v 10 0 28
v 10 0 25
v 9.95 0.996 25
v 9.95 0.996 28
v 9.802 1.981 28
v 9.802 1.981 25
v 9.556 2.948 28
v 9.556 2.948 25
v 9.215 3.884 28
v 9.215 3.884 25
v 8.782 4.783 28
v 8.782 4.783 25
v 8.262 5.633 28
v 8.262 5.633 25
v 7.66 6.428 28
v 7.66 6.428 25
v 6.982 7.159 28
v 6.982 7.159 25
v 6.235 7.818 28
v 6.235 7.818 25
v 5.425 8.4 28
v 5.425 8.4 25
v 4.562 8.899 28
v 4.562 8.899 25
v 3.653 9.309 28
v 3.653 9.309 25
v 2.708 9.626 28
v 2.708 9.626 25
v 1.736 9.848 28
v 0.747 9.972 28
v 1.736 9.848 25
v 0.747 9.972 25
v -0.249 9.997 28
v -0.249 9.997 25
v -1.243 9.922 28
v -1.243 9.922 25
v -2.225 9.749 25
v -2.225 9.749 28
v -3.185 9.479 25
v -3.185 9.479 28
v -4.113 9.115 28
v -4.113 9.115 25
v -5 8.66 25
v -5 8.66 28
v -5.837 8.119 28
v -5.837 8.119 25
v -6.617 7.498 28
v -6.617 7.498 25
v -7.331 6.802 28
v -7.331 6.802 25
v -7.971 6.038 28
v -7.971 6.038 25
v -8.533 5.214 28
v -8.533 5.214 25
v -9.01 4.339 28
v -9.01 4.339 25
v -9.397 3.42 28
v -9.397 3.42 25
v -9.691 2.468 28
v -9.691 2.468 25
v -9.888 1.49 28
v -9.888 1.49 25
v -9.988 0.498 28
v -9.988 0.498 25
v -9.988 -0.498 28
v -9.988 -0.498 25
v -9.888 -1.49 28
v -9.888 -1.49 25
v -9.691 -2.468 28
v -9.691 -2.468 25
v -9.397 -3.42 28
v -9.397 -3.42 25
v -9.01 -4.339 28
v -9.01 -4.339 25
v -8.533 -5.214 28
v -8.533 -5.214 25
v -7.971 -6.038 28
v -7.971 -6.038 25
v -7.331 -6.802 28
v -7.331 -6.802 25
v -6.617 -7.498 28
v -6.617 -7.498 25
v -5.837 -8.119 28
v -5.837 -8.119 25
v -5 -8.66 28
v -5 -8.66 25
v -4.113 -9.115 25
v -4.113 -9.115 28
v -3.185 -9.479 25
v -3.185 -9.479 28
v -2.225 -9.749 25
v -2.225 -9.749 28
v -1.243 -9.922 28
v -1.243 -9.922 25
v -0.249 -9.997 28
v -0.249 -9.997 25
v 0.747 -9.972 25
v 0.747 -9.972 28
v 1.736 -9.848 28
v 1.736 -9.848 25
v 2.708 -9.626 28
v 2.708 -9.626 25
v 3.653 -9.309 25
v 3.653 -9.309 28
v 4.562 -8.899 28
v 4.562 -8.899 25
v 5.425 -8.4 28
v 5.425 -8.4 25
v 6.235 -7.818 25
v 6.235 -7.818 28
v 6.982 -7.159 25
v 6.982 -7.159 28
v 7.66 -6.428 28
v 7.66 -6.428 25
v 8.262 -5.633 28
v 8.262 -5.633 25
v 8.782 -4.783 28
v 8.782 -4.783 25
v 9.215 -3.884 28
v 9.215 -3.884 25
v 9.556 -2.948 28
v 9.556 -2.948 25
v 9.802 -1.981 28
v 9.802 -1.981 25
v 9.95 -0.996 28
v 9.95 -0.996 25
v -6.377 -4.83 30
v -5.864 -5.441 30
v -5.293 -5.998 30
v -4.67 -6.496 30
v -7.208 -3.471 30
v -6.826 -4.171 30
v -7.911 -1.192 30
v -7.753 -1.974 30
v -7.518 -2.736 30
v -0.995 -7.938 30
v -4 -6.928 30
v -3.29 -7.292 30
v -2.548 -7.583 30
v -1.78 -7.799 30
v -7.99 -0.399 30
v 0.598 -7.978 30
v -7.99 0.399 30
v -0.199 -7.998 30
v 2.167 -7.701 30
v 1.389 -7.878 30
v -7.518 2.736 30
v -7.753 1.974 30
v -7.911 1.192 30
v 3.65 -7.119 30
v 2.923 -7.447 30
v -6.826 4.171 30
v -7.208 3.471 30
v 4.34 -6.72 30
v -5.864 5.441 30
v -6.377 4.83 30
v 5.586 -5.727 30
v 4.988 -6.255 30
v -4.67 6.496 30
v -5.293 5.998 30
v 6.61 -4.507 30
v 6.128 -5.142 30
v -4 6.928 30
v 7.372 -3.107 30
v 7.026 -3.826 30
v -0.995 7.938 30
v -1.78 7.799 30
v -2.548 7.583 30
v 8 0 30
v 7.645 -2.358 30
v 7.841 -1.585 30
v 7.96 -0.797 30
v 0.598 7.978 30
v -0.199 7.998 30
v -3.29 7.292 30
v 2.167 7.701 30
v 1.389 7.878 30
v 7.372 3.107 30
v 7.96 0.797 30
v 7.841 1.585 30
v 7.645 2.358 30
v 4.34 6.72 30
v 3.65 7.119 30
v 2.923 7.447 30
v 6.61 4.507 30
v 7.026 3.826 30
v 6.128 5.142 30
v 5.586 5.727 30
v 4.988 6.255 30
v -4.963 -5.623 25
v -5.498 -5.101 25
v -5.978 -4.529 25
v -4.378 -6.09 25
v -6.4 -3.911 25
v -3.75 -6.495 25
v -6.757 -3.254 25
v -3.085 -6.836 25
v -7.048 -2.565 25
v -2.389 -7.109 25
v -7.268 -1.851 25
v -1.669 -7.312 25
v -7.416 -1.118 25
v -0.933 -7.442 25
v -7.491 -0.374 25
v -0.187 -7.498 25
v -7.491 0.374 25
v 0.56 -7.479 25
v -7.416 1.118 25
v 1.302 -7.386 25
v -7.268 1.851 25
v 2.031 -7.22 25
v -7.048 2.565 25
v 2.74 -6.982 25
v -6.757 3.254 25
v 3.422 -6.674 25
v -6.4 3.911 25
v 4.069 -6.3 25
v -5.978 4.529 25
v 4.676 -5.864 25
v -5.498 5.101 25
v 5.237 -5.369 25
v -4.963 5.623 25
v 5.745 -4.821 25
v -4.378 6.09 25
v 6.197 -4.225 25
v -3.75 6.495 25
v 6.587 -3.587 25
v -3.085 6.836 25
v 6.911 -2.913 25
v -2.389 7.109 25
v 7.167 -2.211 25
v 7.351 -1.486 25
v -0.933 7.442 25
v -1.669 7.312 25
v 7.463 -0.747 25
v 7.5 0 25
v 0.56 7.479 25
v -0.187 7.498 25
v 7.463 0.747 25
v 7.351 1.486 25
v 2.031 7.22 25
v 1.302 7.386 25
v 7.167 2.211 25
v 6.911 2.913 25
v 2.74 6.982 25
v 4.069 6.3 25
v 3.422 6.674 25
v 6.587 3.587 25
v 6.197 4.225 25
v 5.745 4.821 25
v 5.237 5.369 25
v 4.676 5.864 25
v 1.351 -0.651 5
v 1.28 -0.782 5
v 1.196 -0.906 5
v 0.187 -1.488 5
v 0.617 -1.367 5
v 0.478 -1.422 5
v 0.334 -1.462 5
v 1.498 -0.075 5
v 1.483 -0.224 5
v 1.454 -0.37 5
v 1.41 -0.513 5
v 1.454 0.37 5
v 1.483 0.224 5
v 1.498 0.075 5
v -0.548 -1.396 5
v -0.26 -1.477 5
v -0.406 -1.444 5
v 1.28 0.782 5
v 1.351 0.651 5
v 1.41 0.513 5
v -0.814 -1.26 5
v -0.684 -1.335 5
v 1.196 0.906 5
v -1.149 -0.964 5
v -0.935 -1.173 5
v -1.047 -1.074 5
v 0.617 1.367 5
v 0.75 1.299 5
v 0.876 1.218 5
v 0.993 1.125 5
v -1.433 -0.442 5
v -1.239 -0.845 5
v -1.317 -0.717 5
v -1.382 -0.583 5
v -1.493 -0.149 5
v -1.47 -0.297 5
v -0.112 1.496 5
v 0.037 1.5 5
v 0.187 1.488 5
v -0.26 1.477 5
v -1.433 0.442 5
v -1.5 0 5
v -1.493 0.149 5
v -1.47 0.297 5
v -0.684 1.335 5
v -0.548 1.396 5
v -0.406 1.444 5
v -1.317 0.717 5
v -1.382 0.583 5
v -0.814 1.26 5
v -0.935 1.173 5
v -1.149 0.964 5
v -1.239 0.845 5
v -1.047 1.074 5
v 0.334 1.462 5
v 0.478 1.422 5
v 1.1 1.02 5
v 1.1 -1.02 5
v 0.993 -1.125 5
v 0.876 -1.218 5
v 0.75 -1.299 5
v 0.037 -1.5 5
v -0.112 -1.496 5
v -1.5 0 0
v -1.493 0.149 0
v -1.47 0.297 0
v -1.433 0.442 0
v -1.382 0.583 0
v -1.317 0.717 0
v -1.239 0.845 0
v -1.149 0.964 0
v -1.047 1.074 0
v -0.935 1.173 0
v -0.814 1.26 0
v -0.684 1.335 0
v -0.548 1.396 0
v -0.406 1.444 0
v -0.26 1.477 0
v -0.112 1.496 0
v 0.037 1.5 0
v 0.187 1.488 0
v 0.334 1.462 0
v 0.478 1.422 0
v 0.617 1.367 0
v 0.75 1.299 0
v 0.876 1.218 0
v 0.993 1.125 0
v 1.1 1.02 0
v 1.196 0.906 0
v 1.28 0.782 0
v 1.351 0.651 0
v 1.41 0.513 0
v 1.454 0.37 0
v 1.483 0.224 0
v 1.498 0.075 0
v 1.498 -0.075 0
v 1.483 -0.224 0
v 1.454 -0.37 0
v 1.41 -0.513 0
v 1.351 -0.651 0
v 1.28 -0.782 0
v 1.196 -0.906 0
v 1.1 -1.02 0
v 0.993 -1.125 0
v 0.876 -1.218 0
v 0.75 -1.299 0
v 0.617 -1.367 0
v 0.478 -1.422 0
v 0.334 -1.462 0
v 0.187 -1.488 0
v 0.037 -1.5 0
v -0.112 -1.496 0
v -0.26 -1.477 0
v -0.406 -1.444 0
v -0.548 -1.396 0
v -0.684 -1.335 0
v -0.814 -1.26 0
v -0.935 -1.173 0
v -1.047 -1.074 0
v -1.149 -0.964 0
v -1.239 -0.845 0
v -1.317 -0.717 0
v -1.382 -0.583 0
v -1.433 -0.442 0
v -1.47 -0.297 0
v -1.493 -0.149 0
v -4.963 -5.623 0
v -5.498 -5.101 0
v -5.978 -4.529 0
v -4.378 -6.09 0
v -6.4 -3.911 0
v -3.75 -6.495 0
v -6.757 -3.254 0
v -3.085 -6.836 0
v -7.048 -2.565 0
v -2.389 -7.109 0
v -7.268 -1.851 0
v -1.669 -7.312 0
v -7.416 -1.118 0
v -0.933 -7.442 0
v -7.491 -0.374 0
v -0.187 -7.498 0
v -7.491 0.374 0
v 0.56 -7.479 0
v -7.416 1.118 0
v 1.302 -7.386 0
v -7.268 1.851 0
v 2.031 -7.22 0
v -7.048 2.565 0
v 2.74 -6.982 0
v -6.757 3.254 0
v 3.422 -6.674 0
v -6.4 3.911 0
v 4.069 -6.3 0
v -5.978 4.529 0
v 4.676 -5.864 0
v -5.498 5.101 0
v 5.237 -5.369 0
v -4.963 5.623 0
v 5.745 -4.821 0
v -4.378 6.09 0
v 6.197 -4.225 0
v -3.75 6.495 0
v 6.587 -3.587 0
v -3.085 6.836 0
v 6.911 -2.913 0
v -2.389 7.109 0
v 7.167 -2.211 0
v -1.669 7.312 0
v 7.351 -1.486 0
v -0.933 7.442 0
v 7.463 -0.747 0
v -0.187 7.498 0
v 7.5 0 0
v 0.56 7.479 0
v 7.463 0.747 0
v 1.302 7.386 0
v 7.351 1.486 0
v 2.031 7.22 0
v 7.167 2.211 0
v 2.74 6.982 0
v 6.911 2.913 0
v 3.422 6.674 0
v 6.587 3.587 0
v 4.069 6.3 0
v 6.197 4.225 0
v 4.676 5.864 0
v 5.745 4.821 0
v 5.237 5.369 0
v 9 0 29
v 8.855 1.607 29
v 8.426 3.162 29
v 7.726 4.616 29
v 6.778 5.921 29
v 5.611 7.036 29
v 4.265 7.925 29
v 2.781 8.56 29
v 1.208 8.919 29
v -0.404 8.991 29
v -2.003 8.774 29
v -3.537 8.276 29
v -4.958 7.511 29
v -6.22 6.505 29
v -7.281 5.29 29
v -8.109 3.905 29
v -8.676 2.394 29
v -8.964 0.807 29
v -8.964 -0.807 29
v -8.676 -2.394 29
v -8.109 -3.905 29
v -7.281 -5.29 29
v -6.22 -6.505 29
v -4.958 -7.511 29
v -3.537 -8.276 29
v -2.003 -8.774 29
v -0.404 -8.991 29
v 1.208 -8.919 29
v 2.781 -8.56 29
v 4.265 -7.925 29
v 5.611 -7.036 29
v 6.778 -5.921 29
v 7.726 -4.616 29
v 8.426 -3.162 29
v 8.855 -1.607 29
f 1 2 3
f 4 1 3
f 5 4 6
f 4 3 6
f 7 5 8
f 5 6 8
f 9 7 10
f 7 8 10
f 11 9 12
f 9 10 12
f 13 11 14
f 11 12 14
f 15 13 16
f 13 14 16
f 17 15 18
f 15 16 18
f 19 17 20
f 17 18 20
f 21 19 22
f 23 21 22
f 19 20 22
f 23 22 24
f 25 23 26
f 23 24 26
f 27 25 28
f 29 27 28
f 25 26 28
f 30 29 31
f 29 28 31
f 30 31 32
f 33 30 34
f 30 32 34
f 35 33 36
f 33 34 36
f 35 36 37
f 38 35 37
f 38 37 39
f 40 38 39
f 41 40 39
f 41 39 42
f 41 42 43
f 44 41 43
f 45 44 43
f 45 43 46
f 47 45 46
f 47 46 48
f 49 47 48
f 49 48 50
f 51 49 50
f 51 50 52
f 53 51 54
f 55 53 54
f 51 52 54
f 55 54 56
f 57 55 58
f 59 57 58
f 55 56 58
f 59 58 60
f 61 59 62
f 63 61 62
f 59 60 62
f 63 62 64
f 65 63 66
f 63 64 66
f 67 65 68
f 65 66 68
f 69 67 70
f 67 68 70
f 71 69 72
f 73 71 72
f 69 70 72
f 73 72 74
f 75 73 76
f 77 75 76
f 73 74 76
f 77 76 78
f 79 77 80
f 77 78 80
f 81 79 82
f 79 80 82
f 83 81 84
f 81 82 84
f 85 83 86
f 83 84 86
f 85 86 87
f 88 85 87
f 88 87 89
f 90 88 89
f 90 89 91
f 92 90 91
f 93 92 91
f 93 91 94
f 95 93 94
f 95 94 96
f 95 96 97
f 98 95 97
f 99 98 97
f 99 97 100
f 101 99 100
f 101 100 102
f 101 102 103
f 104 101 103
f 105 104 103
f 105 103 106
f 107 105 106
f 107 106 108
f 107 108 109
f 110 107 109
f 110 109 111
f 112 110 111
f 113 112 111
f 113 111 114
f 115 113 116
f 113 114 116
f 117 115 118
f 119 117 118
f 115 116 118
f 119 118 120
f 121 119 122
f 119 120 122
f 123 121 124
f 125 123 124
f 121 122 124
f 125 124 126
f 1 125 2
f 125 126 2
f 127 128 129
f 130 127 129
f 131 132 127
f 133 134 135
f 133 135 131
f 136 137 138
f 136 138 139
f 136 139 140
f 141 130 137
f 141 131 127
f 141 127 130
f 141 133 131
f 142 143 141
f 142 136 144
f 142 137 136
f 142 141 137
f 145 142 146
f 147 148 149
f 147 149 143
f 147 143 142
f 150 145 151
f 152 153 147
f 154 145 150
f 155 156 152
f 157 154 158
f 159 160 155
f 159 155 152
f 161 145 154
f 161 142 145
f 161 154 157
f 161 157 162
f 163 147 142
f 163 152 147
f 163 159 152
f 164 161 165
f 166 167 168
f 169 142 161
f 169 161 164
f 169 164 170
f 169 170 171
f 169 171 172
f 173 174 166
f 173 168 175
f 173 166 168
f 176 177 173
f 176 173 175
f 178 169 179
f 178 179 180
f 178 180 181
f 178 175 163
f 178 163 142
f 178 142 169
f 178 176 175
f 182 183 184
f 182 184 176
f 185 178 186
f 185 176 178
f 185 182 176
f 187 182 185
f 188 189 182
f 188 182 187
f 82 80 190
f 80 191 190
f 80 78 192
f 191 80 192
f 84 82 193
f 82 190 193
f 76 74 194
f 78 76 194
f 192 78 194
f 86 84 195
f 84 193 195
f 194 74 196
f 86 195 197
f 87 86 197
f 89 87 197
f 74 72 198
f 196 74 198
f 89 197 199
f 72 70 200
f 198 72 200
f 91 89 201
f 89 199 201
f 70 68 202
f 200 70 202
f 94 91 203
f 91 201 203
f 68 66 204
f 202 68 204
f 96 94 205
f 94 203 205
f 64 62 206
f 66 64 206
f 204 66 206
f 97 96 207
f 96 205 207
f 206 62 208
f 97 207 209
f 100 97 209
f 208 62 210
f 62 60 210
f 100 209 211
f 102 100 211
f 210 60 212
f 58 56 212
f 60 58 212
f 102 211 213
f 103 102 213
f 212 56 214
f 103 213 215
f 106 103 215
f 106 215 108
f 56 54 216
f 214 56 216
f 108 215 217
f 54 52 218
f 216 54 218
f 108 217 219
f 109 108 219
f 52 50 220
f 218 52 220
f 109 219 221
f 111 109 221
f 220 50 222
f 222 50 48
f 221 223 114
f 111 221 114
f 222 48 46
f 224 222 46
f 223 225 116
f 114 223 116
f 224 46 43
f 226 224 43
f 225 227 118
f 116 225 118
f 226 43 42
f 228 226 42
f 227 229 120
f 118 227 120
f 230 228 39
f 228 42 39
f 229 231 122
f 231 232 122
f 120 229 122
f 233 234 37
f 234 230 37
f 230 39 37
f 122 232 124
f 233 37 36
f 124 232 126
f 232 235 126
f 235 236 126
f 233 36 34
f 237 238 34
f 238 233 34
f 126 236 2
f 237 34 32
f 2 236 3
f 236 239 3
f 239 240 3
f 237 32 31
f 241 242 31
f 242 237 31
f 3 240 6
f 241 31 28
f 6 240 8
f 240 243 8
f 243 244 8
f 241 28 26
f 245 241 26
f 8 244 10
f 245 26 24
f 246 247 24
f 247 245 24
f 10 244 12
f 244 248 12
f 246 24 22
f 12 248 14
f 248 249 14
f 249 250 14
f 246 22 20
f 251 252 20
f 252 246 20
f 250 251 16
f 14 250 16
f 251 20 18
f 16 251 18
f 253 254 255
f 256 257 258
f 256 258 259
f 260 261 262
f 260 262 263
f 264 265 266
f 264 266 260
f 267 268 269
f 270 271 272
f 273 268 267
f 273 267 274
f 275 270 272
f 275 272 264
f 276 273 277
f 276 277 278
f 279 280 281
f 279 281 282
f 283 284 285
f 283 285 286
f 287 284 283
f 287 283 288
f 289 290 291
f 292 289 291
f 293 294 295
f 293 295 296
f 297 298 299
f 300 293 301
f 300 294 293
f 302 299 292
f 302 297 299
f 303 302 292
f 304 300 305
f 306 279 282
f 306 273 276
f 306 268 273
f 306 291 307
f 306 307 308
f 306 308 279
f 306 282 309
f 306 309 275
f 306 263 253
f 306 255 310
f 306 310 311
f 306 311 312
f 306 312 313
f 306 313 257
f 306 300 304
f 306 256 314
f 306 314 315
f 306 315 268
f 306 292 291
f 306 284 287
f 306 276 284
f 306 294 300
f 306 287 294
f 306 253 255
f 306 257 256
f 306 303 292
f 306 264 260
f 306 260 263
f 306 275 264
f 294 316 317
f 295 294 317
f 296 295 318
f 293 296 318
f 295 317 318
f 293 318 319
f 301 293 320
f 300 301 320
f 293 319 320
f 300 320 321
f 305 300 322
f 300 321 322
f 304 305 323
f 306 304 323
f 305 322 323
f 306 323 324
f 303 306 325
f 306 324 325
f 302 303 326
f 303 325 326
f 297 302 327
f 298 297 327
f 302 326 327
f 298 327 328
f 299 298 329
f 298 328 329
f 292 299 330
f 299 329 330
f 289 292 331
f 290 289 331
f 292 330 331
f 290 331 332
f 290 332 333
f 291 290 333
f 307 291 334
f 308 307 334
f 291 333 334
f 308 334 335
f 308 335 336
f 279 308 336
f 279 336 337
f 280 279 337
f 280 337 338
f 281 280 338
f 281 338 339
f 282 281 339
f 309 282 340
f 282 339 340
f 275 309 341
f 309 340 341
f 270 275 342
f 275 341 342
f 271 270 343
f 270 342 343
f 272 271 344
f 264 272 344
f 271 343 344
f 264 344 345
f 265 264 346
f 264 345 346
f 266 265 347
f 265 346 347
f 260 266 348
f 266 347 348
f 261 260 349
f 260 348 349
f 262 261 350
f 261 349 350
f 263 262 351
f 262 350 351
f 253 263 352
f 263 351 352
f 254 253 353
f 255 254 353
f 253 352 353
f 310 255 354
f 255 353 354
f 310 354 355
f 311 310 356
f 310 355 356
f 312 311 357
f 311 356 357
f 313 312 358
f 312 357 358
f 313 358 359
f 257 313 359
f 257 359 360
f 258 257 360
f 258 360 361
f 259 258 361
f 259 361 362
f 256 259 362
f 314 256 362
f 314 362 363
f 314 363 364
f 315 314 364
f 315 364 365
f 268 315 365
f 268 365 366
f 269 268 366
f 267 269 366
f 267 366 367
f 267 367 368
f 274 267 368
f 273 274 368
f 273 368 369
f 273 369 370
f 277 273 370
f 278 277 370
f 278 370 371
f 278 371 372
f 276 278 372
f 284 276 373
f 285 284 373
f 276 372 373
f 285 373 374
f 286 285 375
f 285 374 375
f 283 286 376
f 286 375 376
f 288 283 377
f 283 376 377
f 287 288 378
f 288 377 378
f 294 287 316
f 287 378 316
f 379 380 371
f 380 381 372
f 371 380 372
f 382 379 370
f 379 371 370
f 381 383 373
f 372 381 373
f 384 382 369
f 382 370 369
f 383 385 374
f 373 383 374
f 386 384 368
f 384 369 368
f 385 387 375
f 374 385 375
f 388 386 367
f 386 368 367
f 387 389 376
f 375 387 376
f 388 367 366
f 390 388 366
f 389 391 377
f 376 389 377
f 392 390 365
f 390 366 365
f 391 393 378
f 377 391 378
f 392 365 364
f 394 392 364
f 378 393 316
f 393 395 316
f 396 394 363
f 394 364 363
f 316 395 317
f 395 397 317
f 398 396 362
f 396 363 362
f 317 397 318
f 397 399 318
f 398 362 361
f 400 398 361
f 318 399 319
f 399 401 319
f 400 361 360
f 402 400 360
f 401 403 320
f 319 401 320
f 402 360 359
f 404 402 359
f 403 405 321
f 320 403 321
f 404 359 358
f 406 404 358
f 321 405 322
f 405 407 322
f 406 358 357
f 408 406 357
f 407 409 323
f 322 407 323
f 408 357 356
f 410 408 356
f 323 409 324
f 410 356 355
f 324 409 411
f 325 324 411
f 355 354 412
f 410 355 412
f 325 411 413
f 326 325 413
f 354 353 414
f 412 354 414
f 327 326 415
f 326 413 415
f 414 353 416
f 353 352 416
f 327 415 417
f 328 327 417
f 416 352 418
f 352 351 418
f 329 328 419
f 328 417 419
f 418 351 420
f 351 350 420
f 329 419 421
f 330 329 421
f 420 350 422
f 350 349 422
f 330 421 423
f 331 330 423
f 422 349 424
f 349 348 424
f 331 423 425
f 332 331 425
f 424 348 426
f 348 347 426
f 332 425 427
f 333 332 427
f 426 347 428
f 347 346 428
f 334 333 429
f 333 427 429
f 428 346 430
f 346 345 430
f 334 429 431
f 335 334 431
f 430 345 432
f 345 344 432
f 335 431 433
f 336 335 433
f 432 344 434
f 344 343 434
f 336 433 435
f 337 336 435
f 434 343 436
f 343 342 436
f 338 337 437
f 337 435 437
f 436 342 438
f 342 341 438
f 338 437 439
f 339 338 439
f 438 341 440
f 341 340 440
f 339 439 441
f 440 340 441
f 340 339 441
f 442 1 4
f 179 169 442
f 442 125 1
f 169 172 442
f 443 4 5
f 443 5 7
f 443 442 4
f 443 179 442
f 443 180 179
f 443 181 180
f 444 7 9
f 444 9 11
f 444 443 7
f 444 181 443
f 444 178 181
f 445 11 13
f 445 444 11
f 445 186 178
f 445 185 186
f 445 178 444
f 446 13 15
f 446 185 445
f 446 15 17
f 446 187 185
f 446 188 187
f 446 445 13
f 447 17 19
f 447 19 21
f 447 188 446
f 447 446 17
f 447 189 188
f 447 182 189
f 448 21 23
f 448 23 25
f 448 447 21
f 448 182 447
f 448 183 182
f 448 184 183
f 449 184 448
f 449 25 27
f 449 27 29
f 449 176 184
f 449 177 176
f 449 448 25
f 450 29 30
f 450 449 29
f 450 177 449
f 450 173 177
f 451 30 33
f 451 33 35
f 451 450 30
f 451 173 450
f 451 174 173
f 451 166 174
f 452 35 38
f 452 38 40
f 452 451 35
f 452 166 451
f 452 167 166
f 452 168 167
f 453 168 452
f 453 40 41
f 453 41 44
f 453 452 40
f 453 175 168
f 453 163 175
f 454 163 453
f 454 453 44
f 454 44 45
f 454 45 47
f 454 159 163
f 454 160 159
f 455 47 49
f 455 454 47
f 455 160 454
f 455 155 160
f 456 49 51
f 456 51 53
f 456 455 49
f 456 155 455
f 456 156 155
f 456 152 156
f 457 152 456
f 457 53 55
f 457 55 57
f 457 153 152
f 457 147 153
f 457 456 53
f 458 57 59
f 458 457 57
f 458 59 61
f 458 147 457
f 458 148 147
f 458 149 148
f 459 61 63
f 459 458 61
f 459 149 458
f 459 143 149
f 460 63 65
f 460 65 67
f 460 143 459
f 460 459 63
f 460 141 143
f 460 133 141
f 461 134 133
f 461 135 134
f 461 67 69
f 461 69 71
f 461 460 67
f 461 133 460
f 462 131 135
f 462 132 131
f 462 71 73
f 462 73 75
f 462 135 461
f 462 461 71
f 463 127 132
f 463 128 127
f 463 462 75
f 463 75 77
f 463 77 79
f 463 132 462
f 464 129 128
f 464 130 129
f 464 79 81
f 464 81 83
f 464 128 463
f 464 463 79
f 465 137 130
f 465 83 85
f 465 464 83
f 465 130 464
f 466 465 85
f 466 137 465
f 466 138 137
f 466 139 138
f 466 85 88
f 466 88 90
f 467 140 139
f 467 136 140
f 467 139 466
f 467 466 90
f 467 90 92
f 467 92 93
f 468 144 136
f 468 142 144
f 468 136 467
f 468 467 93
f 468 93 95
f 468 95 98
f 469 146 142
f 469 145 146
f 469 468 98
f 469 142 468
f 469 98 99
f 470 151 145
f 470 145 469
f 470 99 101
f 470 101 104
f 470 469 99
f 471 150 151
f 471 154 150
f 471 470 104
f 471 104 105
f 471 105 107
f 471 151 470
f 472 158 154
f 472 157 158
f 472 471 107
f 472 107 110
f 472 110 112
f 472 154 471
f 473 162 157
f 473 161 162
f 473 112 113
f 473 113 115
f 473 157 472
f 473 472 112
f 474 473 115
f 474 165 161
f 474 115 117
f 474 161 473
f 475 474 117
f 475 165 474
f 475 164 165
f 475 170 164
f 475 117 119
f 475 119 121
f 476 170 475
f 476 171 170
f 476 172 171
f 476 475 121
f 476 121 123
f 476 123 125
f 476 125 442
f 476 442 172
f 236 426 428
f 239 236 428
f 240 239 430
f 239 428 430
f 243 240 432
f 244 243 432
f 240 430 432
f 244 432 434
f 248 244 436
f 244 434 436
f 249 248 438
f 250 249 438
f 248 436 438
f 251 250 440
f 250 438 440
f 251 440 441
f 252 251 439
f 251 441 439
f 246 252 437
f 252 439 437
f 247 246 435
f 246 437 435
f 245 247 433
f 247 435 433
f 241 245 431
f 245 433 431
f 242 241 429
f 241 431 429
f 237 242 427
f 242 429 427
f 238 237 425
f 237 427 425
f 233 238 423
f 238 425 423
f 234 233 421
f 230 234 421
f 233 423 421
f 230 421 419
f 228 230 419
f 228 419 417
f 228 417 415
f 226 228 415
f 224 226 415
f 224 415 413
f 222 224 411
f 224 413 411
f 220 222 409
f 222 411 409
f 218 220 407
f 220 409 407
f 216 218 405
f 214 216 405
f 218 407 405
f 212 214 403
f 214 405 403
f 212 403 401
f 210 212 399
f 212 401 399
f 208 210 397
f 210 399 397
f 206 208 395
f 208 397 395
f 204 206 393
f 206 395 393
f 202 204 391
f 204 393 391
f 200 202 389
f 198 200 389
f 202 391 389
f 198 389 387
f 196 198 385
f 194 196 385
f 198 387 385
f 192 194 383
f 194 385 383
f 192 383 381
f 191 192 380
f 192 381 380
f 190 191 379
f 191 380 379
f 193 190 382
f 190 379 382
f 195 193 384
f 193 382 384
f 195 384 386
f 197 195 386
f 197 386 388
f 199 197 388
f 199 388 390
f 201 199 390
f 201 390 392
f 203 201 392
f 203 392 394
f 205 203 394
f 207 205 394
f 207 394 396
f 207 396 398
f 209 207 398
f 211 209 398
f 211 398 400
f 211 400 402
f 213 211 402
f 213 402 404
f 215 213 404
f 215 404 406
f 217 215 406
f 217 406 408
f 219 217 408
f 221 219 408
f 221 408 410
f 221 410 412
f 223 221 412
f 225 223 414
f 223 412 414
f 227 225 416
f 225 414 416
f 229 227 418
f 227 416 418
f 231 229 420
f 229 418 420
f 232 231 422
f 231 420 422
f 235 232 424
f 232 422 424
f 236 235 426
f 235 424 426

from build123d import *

# Parameters (mm, degrees)
SKETCH1_R           = 7.5
BOSS_EXTRUDE1_DEPTH = 25
SKETCH2_R           = 10
BOSS_EXTRUDE2_DEPTH = 5
SKETCH3_R           = 1.5
CUT_EXTRUDE1_DEPTH  = 5
CHAMFER1_SIZE       = 2


with BuildPart() as part:
    # Sketch1 → Boss-Extrude1 (new body)
    with BuildSketch(Plane.XY):
        Circle(SKETCH1_R)
    extrude(amount=BOSS_EXTRUDE1_DEPTH)

    # Sketch2 → Boss-Extrude2 (add)
    with BuildSketch(Plane.XY.offset(25)):
        Circle(SKETCH2_R)
    extrude(amount=BOSS_EXTRUDE2_DEPTH)

    # Sketch3 → Cut-Extrude1 (cut)
    with BuildSketch(Plane(origin=(0, 0, 0), x_dir=(-1, 0, 0), z_dir=(0, 0, -1))):
        Circle(SKETCH3_R)
    extrude(amount=-CUT_EXTRUDE1_DEPTH, mode=Mode.SUBTRACT)

    # Chamfer1
    chamfer1_edges = [part.edges().sort_by_distance(p)[0] for p in [
        (-10, 0, 30),
    ]]
    chamfer(chamfer1_edges, length=CHAMFER1_SIZE)


solid = part.part
